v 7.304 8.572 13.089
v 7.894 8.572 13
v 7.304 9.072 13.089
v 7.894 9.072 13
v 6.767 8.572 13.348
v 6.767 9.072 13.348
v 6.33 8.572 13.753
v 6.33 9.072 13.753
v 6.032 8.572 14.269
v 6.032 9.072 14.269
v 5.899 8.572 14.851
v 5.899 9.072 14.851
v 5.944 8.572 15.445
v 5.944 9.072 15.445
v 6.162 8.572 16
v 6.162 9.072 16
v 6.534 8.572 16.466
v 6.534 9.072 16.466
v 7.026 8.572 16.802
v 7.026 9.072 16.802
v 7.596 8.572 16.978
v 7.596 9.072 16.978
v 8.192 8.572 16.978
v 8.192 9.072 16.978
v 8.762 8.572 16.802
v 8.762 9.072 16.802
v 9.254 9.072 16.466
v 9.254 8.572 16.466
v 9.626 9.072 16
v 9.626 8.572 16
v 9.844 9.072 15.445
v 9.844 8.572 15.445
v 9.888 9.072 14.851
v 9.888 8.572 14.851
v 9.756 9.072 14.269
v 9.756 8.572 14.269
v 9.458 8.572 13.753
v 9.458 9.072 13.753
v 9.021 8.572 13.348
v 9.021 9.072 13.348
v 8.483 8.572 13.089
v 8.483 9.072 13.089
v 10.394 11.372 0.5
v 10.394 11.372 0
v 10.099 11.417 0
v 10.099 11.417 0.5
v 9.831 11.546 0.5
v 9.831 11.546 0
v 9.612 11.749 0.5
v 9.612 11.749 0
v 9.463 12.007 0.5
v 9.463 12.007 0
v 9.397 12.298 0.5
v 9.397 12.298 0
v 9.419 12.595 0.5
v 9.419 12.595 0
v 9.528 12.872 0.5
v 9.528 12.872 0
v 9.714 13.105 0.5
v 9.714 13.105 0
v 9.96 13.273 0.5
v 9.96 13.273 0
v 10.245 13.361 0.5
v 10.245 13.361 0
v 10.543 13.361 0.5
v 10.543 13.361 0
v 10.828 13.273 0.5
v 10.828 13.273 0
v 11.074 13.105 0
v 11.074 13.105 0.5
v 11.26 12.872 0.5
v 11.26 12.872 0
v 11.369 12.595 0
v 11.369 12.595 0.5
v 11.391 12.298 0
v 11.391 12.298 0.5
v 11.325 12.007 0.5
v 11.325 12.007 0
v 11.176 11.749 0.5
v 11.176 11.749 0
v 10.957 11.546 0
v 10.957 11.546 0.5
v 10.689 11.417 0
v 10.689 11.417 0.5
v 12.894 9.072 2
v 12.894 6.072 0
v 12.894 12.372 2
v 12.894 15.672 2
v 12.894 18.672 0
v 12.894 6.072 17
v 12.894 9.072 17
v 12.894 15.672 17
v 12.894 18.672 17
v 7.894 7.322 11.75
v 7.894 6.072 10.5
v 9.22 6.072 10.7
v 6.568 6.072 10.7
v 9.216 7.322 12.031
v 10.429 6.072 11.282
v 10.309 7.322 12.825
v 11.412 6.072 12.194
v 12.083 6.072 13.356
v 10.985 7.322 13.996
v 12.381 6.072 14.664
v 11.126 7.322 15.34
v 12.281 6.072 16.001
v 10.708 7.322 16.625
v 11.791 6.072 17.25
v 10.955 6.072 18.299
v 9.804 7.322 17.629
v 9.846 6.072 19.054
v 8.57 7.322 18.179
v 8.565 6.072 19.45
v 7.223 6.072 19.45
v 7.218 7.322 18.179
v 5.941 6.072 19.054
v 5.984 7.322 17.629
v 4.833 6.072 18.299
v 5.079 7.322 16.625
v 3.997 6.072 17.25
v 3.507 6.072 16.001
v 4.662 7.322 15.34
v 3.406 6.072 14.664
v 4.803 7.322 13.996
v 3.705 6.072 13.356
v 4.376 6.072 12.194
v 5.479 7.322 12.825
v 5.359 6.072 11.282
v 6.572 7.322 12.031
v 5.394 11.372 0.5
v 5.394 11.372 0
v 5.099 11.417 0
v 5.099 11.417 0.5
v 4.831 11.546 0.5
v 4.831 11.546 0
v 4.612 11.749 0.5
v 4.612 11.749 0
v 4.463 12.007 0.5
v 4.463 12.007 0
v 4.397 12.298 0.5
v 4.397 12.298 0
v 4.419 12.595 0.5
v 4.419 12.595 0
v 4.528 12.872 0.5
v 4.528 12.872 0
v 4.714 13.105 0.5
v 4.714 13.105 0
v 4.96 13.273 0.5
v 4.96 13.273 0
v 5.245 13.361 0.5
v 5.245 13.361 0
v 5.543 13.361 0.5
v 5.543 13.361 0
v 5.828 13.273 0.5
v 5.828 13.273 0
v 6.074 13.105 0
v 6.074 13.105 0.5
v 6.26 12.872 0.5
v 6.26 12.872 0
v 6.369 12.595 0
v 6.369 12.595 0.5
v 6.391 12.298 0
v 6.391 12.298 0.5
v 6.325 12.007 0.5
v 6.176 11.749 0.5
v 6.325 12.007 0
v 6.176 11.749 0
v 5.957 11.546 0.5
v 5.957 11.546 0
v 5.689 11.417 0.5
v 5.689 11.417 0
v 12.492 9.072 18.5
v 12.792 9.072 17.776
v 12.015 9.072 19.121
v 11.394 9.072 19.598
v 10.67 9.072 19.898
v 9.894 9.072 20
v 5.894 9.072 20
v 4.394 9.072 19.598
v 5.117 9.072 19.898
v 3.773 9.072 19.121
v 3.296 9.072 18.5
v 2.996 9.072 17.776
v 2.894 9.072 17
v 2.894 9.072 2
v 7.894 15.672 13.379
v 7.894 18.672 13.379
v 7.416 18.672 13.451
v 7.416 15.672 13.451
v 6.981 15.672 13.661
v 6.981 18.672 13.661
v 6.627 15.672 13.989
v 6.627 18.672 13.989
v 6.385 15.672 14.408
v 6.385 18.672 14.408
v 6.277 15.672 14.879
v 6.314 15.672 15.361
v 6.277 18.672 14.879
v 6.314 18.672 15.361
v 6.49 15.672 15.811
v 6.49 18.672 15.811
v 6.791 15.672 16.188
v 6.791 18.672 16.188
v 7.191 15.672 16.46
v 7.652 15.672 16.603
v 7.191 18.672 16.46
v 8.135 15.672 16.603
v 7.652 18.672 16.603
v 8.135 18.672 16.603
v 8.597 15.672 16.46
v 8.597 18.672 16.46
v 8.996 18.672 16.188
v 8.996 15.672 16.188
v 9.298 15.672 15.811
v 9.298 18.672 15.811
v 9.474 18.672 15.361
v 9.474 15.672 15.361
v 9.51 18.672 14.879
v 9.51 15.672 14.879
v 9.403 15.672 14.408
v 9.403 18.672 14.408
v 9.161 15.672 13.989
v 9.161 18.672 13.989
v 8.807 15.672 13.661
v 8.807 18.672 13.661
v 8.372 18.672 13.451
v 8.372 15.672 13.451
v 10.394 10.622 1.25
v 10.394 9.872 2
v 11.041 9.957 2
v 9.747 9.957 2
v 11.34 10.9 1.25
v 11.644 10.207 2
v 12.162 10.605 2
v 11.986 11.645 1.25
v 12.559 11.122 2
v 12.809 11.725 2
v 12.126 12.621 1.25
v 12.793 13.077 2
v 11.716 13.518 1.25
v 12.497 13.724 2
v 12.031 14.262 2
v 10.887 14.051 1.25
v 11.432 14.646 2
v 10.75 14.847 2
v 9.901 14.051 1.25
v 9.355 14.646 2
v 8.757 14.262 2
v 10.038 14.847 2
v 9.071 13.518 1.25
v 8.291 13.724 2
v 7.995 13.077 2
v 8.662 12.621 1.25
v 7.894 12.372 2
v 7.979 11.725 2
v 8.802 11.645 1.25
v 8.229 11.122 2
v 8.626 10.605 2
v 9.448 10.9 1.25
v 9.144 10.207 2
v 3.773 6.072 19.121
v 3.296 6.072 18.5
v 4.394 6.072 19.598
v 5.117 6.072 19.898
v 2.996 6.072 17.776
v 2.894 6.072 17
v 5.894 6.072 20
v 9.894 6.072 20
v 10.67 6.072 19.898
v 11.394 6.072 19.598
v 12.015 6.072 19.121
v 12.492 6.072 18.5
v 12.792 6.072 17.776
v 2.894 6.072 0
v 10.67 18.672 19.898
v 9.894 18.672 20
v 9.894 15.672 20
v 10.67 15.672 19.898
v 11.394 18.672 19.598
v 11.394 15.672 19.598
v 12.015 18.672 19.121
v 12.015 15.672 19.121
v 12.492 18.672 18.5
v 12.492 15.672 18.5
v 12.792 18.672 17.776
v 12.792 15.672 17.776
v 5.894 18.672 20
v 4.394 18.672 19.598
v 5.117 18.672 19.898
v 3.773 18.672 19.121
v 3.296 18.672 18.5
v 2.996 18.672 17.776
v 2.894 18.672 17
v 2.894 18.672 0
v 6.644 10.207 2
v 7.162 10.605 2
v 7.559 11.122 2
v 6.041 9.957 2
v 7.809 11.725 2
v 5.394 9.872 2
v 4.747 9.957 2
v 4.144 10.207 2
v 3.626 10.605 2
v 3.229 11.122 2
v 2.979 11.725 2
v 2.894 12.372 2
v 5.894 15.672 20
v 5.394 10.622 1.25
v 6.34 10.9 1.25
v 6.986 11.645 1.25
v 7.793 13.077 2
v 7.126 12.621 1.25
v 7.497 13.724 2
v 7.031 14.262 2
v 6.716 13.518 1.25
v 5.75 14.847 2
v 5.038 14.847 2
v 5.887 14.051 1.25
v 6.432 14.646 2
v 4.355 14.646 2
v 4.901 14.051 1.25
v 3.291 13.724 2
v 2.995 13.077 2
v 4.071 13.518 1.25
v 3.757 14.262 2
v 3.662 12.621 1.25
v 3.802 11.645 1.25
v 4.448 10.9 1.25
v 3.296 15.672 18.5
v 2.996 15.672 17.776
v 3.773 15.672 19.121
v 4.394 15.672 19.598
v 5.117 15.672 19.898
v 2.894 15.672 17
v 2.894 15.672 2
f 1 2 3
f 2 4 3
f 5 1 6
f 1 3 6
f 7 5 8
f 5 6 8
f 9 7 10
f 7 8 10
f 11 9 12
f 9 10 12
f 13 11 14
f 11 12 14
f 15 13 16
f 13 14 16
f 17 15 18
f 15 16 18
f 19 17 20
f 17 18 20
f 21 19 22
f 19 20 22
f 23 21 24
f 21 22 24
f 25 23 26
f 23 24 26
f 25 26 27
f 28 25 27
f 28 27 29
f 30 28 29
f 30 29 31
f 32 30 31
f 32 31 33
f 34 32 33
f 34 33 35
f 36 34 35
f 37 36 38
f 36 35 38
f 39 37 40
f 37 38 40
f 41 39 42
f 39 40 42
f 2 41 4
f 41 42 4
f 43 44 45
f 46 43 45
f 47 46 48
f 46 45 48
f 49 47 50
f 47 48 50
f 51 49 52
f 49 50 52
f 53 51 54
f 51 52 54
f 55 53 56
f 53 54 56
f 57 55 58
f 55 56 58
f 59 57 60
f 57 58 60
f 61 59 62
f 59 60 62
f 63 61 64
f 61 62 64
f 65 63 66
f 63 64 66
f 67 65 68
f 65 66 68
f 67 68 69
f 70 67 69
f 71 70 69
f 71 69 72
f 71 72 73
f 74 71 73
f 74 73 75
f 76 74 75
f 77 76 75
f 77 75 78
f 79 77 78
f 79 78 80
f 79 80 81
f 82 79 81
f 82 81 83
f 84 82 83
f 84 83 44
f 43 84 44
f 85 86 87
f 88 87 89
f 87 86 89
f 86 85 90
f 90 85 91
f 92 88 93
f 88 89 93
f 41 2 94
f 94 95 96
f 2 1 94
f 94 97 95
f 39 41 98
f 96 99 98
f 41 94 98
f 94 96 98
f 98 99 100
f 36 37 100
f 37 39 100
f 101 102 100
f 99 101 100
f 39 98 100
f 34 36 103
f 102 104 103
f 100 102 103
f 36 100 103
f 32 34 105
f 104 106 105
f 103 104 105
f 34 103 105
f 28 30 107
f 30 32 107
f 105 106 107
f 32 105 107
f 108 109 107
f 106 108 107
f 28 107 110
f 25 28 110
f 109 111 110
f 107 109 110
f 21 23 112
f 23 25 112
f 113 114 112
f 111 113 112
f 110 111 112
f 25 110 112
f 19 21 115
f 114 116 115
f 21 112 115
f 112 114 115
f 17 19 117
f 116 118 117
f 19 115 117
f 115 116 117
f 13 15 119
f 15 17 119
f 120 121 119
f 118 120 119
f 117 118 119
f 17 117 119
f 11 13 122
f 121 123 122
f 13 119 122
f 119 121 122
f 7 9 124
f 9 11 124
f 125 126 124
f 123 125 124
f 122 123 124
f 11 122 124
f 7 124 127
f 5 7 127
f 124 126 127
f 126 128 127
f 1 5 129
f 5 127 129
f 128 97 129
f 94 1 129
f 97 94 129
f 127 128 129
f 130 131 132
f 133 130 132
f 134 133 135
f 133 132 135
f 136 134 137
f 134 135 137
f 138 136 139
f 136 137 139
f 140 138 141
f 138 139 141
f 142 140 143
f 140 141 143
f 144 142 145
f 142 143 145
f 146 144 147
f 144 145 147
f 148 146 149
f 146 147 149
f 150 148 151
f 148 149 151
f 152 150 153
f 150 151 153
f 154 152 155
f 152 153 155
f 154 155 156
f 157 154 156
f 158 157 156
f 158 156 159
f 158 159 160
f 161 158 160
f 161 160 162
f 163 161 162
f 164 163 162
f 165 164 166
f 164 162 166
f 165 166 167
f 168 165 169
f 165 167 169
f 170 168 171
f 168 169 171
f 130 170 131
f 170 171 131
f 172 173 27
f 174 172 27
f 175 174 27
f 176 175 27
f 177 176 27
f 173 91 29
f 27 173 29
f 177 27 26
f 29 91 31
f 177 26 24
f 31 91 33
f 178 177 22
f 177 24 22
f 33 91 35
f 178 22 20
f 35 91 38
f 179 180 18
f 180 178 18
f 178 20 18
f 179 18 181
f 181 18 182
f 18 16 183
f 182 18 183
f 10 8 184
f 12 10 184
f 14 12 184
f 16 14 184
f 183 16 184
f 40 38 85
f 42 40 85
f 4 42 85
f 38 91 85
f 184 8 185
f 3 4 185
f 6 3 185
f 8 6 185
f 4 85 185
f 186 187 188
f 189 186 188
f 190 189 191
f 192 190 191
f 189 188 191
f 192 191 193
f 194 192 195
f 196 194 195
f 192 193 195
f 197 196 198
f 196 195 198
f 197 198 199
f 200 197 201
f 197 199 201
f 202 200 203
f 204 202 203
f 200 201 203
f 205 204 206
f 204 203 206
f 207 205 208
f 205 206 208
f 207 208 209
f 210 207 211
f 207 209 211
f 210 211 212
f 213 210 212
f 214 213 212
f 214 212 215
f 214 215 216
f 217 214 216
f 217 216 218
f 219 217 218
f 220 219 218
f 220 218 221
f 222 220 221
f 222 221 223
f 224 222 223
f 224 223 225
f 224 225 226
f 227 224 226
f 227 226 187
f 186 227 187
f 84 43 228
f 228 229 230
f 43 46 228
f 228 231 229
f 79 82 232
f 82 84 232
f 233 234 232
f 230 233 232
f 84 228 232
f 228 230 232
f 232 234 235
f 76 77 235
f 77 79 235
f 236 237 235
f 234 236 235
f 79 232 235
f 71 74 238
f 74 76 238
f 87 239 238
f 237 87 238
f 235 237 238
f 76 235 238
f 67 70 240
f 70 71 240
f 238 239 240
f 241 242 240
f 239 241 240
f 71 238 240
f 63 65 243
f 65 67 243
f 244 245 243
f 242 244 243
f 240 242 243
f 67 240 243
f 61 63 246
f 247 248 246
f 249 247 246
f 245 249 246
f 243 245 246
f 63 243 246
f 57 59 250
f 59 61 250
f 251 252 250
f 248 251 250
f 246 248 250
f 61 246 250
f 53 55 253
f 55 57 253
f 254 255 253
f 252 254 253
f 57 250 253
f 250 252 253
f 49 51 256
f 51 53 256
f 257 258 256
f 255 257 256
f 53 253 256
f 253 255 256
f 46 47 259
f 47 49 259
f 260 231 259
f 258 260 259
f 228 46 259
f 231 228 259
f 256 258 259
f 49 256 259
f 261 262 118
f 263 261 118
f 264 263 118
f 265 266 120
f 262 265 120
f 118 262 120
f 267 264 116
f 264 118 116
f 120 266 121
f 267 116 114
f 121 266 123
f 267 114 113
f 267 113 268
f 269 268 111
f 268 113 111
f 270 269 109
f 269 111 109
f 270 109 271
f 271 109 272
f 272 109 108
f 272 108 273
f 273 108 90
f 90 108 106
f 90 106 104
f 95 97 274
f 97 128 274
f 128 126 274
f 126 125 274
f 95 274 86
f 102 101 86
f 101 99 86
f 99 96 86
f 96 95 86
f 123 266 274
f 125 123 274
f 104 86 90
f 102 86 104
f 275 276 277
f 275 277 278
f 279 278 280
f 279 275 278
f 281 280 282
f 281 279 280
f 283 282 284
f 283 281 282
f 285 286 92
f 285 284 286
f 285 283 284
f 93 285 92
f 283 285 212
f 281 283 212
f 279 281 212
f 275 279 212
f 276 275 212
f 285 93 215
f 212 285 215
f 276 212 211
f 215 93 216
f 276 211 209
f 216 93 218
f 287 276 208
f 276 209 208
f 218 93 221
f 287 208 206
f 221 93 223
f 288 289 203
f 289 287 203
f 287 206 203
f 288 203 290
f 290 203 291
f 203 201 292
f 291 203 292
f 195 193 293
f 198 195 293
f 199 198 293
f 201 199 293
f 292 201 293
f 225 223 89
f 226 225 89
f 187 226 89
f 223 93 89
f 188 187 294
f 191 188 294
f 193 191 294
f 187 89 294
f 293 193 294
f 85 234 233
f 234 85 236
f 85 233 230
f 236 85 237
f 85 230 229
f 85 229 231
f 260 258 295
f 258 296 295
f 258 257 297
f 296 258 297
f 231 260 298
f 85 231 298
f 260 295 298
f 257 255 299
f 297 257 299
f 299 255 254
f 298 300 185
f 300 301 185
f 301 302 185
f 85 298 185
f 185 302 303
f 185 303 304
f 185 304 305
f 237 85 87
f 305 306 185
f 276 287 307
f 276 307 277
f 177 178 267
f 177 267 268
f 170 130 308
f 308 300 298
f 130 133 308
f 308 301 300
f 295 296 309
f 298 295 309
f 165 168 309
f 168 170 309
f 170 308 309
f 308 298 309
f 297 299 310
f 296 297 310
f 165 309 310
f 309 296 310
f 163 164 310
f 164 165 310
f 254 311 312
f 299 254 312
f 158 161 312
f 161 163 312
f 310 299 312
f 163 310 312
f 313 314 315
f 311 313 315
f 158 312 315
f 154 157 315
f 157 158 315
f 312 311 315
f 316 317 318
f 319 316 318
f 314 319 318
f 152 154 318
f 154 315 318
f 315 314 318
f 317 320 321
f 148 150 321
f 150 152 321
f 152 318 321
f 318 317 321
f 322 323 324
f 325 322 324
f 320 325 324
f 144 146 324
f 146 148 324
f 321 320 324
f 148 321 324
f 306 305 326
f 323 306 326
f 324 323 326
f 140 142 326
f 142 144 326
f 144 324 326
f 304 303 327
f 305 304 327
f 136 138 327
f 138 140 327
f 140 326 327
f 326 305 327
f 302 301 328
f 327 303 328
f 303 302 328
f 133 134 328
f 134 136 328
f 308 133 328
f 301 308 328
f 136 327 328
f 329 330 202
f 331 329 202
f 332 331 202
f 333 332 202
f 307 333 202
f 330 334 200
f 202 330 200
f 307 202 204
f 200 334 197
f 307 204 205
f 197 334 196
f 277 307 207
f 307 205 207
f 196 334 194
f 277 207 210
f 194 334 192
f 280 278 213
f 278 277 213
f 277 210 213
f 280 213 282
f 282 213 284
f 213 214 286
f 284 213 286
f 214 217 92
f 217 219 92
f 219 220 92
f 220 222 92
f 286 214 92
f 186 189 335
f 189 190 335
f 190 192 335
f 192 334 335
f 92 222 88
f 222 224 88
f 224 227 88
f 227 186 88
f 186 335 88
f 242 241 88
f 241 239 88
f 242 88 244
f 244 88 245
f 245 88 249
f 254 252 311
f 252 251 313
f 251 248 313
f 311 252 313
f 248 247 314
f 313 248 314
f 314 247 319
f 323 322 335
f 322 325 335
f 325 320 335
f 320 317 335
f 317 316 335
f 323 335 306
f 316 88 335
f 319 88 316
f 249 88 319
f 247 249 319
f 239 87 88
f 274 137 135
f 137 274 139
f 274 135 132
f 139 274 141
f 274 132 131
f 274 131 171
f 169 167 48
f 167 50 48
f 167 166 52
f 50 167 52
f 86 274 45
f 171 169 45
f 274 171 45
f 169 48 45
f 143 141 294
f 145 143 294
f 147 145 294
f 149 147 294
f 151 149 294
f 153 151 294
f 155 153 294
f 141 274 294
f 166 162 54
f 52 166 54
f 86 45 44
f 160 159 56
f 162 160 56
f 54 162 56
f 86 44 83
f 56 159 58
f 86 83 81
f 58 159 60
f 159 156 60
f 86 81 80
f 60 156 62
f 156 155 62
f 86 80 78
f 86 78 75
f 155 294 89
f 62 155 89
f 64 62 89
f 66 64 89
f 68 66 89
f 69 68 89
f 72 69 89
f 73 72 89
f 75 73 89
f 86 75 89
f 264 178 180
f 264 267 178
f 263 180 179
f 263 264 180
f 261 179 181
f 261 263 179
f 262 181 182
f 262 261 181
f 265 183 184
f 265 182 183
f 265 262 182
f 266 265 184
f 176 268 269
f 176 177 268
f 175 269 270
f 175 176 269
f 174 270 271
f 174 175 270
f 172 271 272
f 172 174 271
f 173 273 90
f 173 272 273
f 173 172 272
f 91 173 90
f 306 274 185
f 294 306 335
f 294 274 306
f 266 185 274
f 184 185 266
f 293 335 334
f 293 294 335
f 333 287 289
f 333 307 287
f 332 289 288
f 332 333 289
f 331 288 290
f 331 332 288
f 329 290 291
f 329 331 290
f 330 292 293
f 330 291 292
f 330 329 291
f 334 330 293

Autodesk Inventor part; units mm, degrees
ref_plane "YZ Plane" through (0, 0, 0) normal (1, 0, 0) x (0, 1, 0)
ref_plane "XZ Plane" through (0, 0, 0) normal (0, 1, 0) x (-1, 0, 0)
ref_plane "XY Plane" through (0, 0, 0) normal (0, 0, 1) x (1, 0, 0)
sketch "Skizze1" plane through (0, 0, 0) normal (0, 0, 1) x (1, 0, 0)
  line L0 (12.8939, 18.6723) -> (2.8939, 18.6723)
  line L1 (2.8939, 18.6723) -> (2.8939, 15.6723)
  line L2 (2.8939, 15.6723) -> (12.8939, 15.6723)
  line L3 (12.8939, 15.6723) -> (12.8939, 18.6723)
  line L4 (12.8939, 9.0723) -> (2.8939, 9.0723)
  line L5 (2.8939, 9.0723) -> (2.8939, 6.0723)
  line L6 (2.8939, 6.0723) -> (12.8939, 6.0723)
  line L7 (12.8939, 6.0723) -> (12.8939, 9.0723)
  line L8 (12.8939, 15.6723) -> (12.8939, 12.3723) construction
  line L9 (12.8939, 12.3723) -> (12.8939, 9.0723) construction
  point P0 (0, 0)
  point P1 (7.8939, 9.0723)
  dimension "d0" = 10
  dimension "d1" = 3
  dimension "d2" = 3
  dimension "d3" = 6.6
extrude "Extrusion1" add sketch "Skizze1" along normal blind 20
fillet "Rundung1" radius 3 4 edges at (12.8939, 7.5723, 20) (12.8939, 17.1723, 20) (2.8939, 17.1723, 20) (2.8939, 7.5723, 20)
sketch "Skizze2" plane through (2.8939, 6.0723, 0) normal (0, -1, 0) x (1, 0, 0)
  circle A0 centre (5, 15) radius 5 construction
  line L0 (10, 0) -> (10, 17) construction
  line L1 (0, 0) -> (0, 17) construction
  line L2 (3, 20) -> (7, 20) construction
  point P0 (-2.8939, 0)
hole "Bohrung1" at (7.8939, 6.0723, 15) direction (0, 1, 0) diameter 3.242 end through all countersink diameter 9 countersink angle 90 thread size "M4x0.7" class "6H" standard "ISO Metric profile"
sketch "Skizze3" plane through (2.8939, 15.6723, 0) normal (0, -1, 0) x (1, 0, 0)
  line L0 (0, 0) -> (10, 0) projected
  line L1 (10, 0) -> (10, 2)
  line L2 (10, 0) -> (10, 17) projected
  line L3 (10, 2) -> (0, 2)
  line L4 (0, 0) -> (0, 17) projected
  point P0 (-2.8939, 0)
  dimension "d15" = 2
extrude "Extrusion2" add sketch "Skizze3" along normal through all
sketch "Skizze4" plane through (2.8939, 15.6723, 2) normal (0, 0, 1) x (1, 0, 0)
  line L0 (10, -3.3) -> (10, 0) construction
  line L1 (10, -3.3) -> (10, -6.6) construction
  line L2 (0, -3.3) -> (0, -6.6) construction
  line L3 (0, 0) -> (0, -3.3) construction
  line L4 (7, 3) -> (3, 3) construction
  line L5 (0, 3) -> (0, 0) construction
  line L6 (-4, -3.3) -> (5, -3.3) construction
  line L7 (-4, -3.3) -> (5, -3.3) construction
  line L8 (-4, -3.3) -> (5, -3.3) construction
  line L9 (2.5, -3.3) -> (5, -3.3) construction
  line L10 (5, -3.3) -> (7.5, -3.3) construction
  point P0 (-2.8939, -15.6723)
  dimension "d34" = 5
  dimension "d35" = 9
  dimension "d36" = 6.3
  dimension "d37" = 5
  dimension "d38" = 9
  dimension "d40" = 9
  dimension "d41" = 0
hole "Bohrung2" at (10.3939, 12.3723, 2) at (5.3939, 12.3723, 2) direction (0, 0, -1) diameter 2 end through all countersink diameter 5 countersink angle 90
sketch "Skizze5" plane through (2.8939, 6.0723, 0) normal (0, -1, 0) x (1, 0, 0)
  circle A0 centre (5, 15) radius 4.5 projected
  point P0 (-2.8939, 0)
hole "Bohrung3" at (7.8939, 6.0723, 15) direction (0, 1, 0) diameter 4 depth 3
properties part number "HalterUmlenkrolleOVR" material "PC/ABS-Kunststoff, 3DDruck, PLA"
